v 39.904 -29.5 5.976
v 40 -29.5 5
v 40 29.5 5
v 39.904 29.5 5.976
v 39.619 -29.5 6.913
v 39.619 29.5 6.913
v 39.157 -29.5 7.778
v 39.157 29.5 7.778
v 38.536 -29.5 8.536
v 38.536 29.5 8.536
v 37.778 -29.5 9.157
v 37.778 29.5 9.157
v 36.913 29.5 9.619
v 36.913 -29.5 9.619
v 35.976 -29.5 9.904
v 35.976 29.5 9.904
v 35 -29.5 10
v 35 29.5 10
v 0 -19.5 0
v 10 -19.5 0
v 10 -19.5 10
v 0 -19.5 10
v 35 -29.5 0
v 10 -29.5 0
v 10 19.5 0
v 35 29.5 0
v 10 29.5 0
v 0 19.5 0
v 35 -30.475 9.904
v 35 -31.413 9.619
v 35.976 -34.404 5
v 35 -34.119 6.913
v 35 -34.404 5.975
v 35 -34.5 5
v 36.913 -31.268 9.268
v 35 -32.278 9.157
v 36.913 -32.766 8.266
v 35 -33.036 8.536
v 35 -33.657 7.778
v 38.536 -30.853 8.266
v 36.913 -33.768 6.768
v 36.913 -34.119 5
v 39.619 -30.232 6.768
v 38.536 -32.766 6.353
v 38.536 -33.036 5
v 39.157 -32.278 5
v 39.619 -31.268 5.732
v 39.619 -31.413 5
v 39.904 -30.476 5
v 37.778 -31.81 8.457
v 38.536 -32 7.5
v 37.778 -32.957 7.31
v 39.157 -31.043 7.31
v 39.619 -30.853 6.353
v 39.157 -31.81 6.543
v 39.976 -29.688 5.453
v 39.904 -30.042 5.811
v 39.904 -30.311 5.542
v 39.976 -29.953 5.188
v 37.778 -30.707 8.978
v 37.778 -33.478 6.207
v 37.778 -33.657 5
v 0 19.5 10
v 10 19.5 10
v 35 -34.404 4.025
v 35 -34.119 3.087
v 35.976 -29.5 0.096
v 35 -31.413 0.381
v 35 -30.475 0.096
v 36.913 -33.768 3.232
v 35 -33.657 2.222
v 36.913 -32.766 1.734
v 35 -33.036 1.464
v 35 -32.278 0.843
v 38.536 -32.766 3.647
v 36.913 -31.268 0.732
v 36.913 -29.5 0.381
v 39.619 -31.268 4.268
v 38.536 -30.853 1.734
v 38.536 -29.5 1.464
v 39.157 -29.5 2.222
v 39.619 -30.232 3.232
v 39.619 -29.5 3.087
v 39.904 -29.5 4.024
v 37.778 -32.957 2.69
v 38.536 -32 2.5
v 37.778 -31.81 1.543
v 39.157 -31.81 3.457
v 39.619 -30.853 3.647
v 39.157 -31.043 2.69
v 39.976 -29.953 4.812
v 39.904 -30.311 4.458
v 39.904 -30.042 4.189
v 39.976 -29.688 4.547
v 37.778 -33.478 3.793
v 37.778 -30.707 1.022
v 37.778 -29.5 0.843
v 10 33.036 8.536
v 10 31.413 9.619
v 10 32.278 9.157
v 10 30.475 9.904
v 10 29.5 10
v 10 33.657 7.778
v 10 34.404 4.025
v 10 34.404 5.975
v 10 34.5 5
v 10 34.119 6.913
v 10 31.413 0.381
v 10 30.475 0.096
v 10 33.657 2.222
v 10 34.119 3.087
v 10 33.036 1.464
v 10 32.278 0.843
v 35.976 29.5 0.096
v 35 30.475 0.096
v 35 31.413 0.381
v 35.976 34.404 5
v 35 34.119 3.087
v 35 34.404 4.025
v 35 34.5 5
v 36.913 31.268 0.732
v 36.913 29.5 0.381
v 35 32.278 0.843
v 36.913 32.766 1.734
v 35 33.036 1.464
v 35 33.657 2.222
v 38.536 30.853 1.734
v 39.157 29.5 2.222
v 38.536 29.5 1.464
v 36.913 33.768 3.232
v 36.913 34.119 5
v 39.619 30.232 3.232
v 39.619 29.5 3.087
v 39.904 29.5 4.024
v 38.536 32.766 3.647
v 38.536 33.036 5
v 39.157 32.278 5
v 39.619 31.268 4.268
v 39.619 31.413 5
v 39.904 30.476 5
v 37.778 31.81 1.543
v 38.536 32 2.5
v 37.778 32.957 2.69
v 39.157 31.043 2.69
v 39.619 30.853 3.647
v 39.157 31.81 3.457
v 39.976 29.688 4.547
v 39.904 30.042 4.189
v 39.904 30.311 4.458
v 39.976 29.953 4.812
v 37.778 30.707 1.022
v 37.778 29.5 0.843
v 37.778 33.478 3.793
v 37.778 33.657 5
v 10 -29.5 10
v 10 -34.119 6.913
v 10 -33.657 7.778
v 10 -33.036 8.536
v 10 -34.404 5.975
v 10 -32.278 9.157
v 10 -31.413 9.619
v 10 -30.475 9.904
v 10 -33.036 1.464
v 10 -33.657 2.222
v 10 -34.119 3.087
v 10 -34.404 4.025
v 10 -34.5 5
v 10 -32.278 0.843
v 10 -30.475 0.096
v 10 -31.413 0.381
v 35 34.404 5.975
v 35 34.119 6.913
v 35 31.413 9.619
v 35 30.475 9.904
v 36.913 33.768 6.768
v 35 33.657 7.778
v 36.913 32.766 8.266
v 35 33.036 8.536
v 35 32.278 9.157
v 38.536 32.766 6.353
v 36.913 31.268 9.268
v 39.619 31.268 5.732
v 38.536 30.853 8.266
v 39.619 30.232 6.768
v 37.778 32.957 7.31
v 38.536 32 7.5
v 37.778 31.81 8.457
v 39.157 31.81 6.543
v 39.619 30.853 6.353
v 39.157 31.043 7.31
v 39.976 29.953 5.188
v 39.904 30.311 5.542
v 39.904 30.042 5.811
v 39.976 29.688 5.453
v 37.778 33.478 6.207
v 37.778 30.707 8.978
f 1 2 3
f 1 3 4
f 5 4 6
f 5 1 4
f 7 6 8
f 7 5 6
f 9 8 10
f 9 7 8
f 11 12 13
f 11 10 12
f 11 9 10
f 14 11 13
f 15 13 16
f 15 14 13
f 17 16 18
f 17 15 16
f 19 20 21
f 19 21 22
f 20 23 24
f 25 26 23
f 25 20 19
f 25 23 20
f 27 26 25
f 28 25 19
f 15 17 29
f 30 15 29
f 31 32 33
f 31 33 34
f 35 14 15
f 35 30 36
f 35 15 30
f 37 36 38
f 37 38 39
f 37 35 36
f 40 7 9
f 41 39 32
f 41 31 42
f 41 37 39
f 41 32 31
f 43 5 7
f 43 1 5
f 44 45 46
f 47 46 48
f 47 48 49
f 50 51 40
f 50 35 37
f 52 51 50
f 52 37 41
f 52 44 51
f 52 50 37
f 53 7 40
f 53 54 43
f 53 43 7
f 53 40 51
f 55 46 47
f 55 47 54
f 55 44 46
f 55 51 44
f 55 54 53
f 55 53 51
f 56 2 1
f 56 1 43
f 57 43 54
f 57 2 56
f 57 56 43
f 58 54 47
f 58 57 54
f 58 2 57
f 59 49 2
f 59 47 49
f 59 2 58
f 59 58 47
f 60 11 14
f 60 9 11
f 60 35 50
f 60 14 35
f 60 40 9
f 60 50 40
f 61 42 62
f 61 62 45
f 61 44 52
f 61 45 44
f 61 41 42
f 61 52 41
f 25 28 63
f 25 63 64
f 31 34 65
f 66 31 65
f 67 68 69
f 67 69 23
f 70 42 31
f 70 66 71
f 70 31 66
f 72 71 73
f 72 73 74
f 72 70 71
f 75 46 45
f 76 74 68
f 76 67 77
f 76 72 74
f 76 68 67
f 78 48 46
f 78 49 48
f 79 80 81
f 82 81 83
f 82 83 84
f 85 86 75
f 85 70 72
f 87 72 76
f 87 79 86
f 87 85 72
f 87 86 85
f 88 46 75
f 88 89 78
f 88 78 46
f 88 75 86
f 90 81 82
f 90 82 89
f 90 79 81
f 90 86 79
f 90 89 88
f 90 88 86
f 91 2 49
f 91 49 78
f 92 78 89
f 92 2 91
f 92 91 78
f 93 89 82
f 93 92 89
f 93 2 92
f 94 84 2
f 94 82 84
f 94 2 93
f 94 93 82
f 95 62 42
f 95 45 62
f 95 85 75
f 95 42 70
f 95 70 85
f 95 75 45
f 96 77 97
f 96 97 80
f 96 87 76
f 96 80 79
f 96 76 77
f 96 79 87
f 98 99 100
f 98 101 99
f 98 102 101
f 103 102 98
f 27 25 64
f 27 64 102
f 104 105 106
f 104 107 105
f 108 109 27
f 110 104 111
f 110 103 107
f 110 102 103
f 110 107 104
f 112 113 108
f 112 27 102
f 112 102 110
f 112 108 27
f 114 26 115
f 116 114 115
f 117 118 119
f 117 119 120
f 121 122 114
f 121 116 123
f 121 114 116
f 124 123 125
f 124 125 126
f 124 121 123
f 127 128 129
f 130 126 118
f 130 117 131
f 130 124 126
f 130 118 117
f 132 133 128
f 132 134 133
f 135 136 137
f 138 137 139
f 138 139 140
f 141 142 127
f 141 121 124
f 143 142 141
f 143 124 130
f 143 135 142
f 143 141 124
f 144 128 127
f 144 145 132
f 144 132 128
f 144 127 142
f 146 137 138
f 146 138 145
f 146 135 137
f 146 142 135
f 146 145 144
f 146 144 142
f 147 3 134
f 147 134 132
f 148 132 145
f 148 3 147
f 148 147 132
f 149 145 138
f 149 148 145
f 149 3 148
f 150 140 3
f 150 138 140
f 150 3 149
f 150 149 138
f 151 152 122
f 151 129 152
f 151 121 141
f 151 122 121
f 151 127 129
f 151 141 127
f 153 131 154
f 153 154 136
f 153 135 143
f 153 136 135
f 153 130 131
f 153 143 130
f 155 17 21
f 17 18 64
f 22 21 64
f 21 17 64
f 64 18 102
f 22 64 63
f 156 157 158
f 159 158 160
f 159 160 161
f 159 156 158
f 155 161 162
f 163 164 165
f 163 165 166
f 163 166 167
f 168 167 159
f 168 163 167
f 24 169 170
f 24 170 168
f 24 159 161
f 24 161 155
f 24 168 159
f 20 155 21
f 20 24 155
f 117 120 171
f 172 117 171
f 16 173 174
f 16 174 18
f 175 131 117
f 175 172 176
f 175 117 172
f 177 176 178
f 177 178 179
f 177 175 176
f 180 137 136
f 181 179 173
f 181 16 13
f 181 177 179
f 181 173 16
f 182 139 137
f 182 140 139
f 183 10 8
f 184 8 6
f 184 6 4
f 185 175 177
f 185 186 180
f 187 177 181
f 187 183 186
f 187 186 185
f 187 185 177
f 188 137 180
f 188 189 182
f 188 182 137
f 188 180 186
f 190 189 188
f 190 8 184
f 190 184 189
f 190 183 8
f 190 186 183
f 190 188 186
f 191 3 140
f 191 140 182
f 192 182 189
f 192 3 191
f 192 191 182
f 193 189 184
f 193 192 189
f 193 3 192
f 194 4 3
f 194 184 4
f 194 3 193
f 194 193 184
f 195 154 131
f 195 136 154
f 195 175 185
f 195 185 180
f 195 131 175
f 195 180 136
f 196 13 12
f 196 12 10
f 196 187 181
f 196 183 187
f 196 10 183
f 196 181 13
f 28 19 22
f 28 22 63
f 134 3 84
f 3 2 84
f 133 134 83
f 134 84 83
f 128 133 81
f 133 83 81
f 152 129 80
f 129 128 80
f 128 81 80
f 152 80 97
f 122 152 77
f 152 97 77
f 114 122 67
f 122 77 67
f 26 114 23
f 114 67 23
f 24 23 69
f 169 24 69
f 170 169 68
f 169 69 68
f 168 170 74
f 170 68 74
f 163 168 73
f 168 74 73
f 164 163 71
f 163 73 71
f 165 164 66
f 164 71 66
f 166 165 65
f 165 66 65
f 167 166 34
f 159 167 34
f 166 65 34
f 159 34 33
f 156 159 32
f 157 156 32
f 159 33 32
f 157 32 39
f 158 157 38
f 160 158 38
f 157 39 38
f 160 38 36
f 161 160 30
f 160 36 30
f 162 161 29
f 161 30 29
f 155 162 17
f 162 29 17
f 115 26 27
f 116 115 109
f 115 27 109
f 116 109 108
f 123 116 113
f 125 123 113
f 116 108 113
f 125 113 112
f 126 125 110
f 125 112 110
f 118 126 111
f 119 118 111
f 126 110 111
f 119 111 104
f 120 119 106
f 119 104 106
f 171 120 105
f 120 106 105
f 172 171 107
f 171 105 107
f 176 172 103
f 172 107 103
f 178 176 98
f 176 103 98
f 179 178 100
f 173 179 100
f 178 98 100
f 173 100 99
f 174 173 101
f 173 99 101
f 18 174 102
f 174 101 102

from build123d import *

# Parameters (mm, degrees)
BOSS_EXTRUDE1_DEPTH = 10
FILLET1_R           = 5
FILLET2_R           = 5


# Some blends are built 0.0001 mm under size
with BuildPart() as part:
    # Sketch1 → Boss-Extrude1 (new body)
    with BuildSketch(Plane.XY):
        Polygon((0, -19.5), (0, 19.5), (10, 19.5), (10, 34.5), (40, 34.5), (40, -34.5), (10, -34.5), (10, -19.5), align=None)
    extrude(amount=BOSS_EXTRUDE1_DEPTH)

    # Fillet1
    fillet1_edges = [part.edges().sort_by_distance(p)[0] for p in [
        (40, 0, 10),
        (40, 34.5, 5),
        (40, -34.5, 5),
        (40, 0, 0),
    ]]
    fillet(fillet1_edges, radius=FILLET1_R - 0.0001)  # a hair under: the kernel refuses the full size

    # Fillet2
    # the kernel refuses this fillet: 5 mm, written as the material it takes off along each edge
    with BuildSketch(Plane(origin=(40, 29.5, 5), x_dir=(0, 0, -1), z_dir=(0, -1, 0))) as fillet2_piece_1:
        with BuildLine():
            CenterArc((0.0001, -4.9999), 4.9999, 0, 90)
            Line((5, -4.9999), (5, 0))
            Line((5, 0), (0.0001, 0))
        make_face()
    revolve(axis=Axis((40, 29.5, 5), (1, 0, 0)), revolution_arc=90, mode=Mode.SUBTRACT)
    with BuildSketch(Plane(origin=(40, 29.5, 5), x_dir=(0, 1, 0), z_dir=(0, 0, -1))) as fillet2_piece_2:
        with BuildLine():
            CenterArc((0.0001, -4.9999), 4.9999, 0, 90)
            Line((5, -4.9999), (5, 0))
            Line((5, 0), (0.0001, 0))
        make_face()
    revolve(axis=Axis((40, 29.5, 5), (1, 0, 0)), revolution_arc=90, mode=Mode.SUBTRACT)
    with BuildSketch(Plane(origin=(40, -29.5, 5), x_dir=(0, -1, 0), z_dir=(0, 0, 1))) as fillet2_piece_3:
        with BuildLine():
            CenterArc((0.0001, -4.9999), 4.9999, 0, 90)
            Line((5, -4.9999), (5, 0))
            Line((5, 0), (0.0001, 0))
        make_face()
    revolve(axis=Axis((40, -29.5, 5), (1, 0, 0)), revolution_arc=90, mode=Mode.SUBTRACT)
    with BuildSketch(Plane(origin=(40, -29.5, 5), x_dir=(0, 0, 1), z_dir=(0, 1, 0))) as fillet2_piece_4:
        with BuildLine():
            CenterArc((0.0001, -4.9999), 4.9999, 0, 90)
            Line((5, -4.9999), (5, 0))
            Line((5, 0), (0.0001, 0))
        make_face()
    revolve(axis=Axis((40, -29.5, 5), (1, 0, 0)), revolution_arc=90, mode=Mode.SUBTRACT)
    with BuildSketch(Plane(origin=(-2.5, 34.5, 0), x_dir=(0, 0, 1), z_dir=(1, 0, 0)), Plane(origin=(40, -34.5, 10), x_dir=(0, 1, 0), z_dir=(-1, 0, 0))) as fillet2_piece_5:
        with BuildLine():
            CenterArc((FILLET2_R, FILLET2_R), FILLET2_R, 180, 90)
            Line((0, FILLET2_R), (0, 0))
            Line((0, 0), (FILLET2_R, 0))
        make_face()
    extrude(amount=42.5, mode=Mode.SUBTRACT)
    with BuildSketch(Plane(origin=(-2.5, 34.5, 10), x_dir=(0, 0, -1), z_dir=(1, 0, 0)), Plane(origin=(40, -34.5, 0), x_dir=(0, 1, 0), z_dir=(-1, 0, 0))) as fillet2_piece_6:
        with BuildLine():
            CenterArc((FILLET2_R, -FILLET2_R), FILLET2_R, 90, 90)
            Line((0, -FILLET2_R), (0, 0))
            Line((0, 0), (FILLET2_R, 0))
        make_face()
    extrude(amount=42.5, mode=Mode.SUBTRACT)


solid = part.part
